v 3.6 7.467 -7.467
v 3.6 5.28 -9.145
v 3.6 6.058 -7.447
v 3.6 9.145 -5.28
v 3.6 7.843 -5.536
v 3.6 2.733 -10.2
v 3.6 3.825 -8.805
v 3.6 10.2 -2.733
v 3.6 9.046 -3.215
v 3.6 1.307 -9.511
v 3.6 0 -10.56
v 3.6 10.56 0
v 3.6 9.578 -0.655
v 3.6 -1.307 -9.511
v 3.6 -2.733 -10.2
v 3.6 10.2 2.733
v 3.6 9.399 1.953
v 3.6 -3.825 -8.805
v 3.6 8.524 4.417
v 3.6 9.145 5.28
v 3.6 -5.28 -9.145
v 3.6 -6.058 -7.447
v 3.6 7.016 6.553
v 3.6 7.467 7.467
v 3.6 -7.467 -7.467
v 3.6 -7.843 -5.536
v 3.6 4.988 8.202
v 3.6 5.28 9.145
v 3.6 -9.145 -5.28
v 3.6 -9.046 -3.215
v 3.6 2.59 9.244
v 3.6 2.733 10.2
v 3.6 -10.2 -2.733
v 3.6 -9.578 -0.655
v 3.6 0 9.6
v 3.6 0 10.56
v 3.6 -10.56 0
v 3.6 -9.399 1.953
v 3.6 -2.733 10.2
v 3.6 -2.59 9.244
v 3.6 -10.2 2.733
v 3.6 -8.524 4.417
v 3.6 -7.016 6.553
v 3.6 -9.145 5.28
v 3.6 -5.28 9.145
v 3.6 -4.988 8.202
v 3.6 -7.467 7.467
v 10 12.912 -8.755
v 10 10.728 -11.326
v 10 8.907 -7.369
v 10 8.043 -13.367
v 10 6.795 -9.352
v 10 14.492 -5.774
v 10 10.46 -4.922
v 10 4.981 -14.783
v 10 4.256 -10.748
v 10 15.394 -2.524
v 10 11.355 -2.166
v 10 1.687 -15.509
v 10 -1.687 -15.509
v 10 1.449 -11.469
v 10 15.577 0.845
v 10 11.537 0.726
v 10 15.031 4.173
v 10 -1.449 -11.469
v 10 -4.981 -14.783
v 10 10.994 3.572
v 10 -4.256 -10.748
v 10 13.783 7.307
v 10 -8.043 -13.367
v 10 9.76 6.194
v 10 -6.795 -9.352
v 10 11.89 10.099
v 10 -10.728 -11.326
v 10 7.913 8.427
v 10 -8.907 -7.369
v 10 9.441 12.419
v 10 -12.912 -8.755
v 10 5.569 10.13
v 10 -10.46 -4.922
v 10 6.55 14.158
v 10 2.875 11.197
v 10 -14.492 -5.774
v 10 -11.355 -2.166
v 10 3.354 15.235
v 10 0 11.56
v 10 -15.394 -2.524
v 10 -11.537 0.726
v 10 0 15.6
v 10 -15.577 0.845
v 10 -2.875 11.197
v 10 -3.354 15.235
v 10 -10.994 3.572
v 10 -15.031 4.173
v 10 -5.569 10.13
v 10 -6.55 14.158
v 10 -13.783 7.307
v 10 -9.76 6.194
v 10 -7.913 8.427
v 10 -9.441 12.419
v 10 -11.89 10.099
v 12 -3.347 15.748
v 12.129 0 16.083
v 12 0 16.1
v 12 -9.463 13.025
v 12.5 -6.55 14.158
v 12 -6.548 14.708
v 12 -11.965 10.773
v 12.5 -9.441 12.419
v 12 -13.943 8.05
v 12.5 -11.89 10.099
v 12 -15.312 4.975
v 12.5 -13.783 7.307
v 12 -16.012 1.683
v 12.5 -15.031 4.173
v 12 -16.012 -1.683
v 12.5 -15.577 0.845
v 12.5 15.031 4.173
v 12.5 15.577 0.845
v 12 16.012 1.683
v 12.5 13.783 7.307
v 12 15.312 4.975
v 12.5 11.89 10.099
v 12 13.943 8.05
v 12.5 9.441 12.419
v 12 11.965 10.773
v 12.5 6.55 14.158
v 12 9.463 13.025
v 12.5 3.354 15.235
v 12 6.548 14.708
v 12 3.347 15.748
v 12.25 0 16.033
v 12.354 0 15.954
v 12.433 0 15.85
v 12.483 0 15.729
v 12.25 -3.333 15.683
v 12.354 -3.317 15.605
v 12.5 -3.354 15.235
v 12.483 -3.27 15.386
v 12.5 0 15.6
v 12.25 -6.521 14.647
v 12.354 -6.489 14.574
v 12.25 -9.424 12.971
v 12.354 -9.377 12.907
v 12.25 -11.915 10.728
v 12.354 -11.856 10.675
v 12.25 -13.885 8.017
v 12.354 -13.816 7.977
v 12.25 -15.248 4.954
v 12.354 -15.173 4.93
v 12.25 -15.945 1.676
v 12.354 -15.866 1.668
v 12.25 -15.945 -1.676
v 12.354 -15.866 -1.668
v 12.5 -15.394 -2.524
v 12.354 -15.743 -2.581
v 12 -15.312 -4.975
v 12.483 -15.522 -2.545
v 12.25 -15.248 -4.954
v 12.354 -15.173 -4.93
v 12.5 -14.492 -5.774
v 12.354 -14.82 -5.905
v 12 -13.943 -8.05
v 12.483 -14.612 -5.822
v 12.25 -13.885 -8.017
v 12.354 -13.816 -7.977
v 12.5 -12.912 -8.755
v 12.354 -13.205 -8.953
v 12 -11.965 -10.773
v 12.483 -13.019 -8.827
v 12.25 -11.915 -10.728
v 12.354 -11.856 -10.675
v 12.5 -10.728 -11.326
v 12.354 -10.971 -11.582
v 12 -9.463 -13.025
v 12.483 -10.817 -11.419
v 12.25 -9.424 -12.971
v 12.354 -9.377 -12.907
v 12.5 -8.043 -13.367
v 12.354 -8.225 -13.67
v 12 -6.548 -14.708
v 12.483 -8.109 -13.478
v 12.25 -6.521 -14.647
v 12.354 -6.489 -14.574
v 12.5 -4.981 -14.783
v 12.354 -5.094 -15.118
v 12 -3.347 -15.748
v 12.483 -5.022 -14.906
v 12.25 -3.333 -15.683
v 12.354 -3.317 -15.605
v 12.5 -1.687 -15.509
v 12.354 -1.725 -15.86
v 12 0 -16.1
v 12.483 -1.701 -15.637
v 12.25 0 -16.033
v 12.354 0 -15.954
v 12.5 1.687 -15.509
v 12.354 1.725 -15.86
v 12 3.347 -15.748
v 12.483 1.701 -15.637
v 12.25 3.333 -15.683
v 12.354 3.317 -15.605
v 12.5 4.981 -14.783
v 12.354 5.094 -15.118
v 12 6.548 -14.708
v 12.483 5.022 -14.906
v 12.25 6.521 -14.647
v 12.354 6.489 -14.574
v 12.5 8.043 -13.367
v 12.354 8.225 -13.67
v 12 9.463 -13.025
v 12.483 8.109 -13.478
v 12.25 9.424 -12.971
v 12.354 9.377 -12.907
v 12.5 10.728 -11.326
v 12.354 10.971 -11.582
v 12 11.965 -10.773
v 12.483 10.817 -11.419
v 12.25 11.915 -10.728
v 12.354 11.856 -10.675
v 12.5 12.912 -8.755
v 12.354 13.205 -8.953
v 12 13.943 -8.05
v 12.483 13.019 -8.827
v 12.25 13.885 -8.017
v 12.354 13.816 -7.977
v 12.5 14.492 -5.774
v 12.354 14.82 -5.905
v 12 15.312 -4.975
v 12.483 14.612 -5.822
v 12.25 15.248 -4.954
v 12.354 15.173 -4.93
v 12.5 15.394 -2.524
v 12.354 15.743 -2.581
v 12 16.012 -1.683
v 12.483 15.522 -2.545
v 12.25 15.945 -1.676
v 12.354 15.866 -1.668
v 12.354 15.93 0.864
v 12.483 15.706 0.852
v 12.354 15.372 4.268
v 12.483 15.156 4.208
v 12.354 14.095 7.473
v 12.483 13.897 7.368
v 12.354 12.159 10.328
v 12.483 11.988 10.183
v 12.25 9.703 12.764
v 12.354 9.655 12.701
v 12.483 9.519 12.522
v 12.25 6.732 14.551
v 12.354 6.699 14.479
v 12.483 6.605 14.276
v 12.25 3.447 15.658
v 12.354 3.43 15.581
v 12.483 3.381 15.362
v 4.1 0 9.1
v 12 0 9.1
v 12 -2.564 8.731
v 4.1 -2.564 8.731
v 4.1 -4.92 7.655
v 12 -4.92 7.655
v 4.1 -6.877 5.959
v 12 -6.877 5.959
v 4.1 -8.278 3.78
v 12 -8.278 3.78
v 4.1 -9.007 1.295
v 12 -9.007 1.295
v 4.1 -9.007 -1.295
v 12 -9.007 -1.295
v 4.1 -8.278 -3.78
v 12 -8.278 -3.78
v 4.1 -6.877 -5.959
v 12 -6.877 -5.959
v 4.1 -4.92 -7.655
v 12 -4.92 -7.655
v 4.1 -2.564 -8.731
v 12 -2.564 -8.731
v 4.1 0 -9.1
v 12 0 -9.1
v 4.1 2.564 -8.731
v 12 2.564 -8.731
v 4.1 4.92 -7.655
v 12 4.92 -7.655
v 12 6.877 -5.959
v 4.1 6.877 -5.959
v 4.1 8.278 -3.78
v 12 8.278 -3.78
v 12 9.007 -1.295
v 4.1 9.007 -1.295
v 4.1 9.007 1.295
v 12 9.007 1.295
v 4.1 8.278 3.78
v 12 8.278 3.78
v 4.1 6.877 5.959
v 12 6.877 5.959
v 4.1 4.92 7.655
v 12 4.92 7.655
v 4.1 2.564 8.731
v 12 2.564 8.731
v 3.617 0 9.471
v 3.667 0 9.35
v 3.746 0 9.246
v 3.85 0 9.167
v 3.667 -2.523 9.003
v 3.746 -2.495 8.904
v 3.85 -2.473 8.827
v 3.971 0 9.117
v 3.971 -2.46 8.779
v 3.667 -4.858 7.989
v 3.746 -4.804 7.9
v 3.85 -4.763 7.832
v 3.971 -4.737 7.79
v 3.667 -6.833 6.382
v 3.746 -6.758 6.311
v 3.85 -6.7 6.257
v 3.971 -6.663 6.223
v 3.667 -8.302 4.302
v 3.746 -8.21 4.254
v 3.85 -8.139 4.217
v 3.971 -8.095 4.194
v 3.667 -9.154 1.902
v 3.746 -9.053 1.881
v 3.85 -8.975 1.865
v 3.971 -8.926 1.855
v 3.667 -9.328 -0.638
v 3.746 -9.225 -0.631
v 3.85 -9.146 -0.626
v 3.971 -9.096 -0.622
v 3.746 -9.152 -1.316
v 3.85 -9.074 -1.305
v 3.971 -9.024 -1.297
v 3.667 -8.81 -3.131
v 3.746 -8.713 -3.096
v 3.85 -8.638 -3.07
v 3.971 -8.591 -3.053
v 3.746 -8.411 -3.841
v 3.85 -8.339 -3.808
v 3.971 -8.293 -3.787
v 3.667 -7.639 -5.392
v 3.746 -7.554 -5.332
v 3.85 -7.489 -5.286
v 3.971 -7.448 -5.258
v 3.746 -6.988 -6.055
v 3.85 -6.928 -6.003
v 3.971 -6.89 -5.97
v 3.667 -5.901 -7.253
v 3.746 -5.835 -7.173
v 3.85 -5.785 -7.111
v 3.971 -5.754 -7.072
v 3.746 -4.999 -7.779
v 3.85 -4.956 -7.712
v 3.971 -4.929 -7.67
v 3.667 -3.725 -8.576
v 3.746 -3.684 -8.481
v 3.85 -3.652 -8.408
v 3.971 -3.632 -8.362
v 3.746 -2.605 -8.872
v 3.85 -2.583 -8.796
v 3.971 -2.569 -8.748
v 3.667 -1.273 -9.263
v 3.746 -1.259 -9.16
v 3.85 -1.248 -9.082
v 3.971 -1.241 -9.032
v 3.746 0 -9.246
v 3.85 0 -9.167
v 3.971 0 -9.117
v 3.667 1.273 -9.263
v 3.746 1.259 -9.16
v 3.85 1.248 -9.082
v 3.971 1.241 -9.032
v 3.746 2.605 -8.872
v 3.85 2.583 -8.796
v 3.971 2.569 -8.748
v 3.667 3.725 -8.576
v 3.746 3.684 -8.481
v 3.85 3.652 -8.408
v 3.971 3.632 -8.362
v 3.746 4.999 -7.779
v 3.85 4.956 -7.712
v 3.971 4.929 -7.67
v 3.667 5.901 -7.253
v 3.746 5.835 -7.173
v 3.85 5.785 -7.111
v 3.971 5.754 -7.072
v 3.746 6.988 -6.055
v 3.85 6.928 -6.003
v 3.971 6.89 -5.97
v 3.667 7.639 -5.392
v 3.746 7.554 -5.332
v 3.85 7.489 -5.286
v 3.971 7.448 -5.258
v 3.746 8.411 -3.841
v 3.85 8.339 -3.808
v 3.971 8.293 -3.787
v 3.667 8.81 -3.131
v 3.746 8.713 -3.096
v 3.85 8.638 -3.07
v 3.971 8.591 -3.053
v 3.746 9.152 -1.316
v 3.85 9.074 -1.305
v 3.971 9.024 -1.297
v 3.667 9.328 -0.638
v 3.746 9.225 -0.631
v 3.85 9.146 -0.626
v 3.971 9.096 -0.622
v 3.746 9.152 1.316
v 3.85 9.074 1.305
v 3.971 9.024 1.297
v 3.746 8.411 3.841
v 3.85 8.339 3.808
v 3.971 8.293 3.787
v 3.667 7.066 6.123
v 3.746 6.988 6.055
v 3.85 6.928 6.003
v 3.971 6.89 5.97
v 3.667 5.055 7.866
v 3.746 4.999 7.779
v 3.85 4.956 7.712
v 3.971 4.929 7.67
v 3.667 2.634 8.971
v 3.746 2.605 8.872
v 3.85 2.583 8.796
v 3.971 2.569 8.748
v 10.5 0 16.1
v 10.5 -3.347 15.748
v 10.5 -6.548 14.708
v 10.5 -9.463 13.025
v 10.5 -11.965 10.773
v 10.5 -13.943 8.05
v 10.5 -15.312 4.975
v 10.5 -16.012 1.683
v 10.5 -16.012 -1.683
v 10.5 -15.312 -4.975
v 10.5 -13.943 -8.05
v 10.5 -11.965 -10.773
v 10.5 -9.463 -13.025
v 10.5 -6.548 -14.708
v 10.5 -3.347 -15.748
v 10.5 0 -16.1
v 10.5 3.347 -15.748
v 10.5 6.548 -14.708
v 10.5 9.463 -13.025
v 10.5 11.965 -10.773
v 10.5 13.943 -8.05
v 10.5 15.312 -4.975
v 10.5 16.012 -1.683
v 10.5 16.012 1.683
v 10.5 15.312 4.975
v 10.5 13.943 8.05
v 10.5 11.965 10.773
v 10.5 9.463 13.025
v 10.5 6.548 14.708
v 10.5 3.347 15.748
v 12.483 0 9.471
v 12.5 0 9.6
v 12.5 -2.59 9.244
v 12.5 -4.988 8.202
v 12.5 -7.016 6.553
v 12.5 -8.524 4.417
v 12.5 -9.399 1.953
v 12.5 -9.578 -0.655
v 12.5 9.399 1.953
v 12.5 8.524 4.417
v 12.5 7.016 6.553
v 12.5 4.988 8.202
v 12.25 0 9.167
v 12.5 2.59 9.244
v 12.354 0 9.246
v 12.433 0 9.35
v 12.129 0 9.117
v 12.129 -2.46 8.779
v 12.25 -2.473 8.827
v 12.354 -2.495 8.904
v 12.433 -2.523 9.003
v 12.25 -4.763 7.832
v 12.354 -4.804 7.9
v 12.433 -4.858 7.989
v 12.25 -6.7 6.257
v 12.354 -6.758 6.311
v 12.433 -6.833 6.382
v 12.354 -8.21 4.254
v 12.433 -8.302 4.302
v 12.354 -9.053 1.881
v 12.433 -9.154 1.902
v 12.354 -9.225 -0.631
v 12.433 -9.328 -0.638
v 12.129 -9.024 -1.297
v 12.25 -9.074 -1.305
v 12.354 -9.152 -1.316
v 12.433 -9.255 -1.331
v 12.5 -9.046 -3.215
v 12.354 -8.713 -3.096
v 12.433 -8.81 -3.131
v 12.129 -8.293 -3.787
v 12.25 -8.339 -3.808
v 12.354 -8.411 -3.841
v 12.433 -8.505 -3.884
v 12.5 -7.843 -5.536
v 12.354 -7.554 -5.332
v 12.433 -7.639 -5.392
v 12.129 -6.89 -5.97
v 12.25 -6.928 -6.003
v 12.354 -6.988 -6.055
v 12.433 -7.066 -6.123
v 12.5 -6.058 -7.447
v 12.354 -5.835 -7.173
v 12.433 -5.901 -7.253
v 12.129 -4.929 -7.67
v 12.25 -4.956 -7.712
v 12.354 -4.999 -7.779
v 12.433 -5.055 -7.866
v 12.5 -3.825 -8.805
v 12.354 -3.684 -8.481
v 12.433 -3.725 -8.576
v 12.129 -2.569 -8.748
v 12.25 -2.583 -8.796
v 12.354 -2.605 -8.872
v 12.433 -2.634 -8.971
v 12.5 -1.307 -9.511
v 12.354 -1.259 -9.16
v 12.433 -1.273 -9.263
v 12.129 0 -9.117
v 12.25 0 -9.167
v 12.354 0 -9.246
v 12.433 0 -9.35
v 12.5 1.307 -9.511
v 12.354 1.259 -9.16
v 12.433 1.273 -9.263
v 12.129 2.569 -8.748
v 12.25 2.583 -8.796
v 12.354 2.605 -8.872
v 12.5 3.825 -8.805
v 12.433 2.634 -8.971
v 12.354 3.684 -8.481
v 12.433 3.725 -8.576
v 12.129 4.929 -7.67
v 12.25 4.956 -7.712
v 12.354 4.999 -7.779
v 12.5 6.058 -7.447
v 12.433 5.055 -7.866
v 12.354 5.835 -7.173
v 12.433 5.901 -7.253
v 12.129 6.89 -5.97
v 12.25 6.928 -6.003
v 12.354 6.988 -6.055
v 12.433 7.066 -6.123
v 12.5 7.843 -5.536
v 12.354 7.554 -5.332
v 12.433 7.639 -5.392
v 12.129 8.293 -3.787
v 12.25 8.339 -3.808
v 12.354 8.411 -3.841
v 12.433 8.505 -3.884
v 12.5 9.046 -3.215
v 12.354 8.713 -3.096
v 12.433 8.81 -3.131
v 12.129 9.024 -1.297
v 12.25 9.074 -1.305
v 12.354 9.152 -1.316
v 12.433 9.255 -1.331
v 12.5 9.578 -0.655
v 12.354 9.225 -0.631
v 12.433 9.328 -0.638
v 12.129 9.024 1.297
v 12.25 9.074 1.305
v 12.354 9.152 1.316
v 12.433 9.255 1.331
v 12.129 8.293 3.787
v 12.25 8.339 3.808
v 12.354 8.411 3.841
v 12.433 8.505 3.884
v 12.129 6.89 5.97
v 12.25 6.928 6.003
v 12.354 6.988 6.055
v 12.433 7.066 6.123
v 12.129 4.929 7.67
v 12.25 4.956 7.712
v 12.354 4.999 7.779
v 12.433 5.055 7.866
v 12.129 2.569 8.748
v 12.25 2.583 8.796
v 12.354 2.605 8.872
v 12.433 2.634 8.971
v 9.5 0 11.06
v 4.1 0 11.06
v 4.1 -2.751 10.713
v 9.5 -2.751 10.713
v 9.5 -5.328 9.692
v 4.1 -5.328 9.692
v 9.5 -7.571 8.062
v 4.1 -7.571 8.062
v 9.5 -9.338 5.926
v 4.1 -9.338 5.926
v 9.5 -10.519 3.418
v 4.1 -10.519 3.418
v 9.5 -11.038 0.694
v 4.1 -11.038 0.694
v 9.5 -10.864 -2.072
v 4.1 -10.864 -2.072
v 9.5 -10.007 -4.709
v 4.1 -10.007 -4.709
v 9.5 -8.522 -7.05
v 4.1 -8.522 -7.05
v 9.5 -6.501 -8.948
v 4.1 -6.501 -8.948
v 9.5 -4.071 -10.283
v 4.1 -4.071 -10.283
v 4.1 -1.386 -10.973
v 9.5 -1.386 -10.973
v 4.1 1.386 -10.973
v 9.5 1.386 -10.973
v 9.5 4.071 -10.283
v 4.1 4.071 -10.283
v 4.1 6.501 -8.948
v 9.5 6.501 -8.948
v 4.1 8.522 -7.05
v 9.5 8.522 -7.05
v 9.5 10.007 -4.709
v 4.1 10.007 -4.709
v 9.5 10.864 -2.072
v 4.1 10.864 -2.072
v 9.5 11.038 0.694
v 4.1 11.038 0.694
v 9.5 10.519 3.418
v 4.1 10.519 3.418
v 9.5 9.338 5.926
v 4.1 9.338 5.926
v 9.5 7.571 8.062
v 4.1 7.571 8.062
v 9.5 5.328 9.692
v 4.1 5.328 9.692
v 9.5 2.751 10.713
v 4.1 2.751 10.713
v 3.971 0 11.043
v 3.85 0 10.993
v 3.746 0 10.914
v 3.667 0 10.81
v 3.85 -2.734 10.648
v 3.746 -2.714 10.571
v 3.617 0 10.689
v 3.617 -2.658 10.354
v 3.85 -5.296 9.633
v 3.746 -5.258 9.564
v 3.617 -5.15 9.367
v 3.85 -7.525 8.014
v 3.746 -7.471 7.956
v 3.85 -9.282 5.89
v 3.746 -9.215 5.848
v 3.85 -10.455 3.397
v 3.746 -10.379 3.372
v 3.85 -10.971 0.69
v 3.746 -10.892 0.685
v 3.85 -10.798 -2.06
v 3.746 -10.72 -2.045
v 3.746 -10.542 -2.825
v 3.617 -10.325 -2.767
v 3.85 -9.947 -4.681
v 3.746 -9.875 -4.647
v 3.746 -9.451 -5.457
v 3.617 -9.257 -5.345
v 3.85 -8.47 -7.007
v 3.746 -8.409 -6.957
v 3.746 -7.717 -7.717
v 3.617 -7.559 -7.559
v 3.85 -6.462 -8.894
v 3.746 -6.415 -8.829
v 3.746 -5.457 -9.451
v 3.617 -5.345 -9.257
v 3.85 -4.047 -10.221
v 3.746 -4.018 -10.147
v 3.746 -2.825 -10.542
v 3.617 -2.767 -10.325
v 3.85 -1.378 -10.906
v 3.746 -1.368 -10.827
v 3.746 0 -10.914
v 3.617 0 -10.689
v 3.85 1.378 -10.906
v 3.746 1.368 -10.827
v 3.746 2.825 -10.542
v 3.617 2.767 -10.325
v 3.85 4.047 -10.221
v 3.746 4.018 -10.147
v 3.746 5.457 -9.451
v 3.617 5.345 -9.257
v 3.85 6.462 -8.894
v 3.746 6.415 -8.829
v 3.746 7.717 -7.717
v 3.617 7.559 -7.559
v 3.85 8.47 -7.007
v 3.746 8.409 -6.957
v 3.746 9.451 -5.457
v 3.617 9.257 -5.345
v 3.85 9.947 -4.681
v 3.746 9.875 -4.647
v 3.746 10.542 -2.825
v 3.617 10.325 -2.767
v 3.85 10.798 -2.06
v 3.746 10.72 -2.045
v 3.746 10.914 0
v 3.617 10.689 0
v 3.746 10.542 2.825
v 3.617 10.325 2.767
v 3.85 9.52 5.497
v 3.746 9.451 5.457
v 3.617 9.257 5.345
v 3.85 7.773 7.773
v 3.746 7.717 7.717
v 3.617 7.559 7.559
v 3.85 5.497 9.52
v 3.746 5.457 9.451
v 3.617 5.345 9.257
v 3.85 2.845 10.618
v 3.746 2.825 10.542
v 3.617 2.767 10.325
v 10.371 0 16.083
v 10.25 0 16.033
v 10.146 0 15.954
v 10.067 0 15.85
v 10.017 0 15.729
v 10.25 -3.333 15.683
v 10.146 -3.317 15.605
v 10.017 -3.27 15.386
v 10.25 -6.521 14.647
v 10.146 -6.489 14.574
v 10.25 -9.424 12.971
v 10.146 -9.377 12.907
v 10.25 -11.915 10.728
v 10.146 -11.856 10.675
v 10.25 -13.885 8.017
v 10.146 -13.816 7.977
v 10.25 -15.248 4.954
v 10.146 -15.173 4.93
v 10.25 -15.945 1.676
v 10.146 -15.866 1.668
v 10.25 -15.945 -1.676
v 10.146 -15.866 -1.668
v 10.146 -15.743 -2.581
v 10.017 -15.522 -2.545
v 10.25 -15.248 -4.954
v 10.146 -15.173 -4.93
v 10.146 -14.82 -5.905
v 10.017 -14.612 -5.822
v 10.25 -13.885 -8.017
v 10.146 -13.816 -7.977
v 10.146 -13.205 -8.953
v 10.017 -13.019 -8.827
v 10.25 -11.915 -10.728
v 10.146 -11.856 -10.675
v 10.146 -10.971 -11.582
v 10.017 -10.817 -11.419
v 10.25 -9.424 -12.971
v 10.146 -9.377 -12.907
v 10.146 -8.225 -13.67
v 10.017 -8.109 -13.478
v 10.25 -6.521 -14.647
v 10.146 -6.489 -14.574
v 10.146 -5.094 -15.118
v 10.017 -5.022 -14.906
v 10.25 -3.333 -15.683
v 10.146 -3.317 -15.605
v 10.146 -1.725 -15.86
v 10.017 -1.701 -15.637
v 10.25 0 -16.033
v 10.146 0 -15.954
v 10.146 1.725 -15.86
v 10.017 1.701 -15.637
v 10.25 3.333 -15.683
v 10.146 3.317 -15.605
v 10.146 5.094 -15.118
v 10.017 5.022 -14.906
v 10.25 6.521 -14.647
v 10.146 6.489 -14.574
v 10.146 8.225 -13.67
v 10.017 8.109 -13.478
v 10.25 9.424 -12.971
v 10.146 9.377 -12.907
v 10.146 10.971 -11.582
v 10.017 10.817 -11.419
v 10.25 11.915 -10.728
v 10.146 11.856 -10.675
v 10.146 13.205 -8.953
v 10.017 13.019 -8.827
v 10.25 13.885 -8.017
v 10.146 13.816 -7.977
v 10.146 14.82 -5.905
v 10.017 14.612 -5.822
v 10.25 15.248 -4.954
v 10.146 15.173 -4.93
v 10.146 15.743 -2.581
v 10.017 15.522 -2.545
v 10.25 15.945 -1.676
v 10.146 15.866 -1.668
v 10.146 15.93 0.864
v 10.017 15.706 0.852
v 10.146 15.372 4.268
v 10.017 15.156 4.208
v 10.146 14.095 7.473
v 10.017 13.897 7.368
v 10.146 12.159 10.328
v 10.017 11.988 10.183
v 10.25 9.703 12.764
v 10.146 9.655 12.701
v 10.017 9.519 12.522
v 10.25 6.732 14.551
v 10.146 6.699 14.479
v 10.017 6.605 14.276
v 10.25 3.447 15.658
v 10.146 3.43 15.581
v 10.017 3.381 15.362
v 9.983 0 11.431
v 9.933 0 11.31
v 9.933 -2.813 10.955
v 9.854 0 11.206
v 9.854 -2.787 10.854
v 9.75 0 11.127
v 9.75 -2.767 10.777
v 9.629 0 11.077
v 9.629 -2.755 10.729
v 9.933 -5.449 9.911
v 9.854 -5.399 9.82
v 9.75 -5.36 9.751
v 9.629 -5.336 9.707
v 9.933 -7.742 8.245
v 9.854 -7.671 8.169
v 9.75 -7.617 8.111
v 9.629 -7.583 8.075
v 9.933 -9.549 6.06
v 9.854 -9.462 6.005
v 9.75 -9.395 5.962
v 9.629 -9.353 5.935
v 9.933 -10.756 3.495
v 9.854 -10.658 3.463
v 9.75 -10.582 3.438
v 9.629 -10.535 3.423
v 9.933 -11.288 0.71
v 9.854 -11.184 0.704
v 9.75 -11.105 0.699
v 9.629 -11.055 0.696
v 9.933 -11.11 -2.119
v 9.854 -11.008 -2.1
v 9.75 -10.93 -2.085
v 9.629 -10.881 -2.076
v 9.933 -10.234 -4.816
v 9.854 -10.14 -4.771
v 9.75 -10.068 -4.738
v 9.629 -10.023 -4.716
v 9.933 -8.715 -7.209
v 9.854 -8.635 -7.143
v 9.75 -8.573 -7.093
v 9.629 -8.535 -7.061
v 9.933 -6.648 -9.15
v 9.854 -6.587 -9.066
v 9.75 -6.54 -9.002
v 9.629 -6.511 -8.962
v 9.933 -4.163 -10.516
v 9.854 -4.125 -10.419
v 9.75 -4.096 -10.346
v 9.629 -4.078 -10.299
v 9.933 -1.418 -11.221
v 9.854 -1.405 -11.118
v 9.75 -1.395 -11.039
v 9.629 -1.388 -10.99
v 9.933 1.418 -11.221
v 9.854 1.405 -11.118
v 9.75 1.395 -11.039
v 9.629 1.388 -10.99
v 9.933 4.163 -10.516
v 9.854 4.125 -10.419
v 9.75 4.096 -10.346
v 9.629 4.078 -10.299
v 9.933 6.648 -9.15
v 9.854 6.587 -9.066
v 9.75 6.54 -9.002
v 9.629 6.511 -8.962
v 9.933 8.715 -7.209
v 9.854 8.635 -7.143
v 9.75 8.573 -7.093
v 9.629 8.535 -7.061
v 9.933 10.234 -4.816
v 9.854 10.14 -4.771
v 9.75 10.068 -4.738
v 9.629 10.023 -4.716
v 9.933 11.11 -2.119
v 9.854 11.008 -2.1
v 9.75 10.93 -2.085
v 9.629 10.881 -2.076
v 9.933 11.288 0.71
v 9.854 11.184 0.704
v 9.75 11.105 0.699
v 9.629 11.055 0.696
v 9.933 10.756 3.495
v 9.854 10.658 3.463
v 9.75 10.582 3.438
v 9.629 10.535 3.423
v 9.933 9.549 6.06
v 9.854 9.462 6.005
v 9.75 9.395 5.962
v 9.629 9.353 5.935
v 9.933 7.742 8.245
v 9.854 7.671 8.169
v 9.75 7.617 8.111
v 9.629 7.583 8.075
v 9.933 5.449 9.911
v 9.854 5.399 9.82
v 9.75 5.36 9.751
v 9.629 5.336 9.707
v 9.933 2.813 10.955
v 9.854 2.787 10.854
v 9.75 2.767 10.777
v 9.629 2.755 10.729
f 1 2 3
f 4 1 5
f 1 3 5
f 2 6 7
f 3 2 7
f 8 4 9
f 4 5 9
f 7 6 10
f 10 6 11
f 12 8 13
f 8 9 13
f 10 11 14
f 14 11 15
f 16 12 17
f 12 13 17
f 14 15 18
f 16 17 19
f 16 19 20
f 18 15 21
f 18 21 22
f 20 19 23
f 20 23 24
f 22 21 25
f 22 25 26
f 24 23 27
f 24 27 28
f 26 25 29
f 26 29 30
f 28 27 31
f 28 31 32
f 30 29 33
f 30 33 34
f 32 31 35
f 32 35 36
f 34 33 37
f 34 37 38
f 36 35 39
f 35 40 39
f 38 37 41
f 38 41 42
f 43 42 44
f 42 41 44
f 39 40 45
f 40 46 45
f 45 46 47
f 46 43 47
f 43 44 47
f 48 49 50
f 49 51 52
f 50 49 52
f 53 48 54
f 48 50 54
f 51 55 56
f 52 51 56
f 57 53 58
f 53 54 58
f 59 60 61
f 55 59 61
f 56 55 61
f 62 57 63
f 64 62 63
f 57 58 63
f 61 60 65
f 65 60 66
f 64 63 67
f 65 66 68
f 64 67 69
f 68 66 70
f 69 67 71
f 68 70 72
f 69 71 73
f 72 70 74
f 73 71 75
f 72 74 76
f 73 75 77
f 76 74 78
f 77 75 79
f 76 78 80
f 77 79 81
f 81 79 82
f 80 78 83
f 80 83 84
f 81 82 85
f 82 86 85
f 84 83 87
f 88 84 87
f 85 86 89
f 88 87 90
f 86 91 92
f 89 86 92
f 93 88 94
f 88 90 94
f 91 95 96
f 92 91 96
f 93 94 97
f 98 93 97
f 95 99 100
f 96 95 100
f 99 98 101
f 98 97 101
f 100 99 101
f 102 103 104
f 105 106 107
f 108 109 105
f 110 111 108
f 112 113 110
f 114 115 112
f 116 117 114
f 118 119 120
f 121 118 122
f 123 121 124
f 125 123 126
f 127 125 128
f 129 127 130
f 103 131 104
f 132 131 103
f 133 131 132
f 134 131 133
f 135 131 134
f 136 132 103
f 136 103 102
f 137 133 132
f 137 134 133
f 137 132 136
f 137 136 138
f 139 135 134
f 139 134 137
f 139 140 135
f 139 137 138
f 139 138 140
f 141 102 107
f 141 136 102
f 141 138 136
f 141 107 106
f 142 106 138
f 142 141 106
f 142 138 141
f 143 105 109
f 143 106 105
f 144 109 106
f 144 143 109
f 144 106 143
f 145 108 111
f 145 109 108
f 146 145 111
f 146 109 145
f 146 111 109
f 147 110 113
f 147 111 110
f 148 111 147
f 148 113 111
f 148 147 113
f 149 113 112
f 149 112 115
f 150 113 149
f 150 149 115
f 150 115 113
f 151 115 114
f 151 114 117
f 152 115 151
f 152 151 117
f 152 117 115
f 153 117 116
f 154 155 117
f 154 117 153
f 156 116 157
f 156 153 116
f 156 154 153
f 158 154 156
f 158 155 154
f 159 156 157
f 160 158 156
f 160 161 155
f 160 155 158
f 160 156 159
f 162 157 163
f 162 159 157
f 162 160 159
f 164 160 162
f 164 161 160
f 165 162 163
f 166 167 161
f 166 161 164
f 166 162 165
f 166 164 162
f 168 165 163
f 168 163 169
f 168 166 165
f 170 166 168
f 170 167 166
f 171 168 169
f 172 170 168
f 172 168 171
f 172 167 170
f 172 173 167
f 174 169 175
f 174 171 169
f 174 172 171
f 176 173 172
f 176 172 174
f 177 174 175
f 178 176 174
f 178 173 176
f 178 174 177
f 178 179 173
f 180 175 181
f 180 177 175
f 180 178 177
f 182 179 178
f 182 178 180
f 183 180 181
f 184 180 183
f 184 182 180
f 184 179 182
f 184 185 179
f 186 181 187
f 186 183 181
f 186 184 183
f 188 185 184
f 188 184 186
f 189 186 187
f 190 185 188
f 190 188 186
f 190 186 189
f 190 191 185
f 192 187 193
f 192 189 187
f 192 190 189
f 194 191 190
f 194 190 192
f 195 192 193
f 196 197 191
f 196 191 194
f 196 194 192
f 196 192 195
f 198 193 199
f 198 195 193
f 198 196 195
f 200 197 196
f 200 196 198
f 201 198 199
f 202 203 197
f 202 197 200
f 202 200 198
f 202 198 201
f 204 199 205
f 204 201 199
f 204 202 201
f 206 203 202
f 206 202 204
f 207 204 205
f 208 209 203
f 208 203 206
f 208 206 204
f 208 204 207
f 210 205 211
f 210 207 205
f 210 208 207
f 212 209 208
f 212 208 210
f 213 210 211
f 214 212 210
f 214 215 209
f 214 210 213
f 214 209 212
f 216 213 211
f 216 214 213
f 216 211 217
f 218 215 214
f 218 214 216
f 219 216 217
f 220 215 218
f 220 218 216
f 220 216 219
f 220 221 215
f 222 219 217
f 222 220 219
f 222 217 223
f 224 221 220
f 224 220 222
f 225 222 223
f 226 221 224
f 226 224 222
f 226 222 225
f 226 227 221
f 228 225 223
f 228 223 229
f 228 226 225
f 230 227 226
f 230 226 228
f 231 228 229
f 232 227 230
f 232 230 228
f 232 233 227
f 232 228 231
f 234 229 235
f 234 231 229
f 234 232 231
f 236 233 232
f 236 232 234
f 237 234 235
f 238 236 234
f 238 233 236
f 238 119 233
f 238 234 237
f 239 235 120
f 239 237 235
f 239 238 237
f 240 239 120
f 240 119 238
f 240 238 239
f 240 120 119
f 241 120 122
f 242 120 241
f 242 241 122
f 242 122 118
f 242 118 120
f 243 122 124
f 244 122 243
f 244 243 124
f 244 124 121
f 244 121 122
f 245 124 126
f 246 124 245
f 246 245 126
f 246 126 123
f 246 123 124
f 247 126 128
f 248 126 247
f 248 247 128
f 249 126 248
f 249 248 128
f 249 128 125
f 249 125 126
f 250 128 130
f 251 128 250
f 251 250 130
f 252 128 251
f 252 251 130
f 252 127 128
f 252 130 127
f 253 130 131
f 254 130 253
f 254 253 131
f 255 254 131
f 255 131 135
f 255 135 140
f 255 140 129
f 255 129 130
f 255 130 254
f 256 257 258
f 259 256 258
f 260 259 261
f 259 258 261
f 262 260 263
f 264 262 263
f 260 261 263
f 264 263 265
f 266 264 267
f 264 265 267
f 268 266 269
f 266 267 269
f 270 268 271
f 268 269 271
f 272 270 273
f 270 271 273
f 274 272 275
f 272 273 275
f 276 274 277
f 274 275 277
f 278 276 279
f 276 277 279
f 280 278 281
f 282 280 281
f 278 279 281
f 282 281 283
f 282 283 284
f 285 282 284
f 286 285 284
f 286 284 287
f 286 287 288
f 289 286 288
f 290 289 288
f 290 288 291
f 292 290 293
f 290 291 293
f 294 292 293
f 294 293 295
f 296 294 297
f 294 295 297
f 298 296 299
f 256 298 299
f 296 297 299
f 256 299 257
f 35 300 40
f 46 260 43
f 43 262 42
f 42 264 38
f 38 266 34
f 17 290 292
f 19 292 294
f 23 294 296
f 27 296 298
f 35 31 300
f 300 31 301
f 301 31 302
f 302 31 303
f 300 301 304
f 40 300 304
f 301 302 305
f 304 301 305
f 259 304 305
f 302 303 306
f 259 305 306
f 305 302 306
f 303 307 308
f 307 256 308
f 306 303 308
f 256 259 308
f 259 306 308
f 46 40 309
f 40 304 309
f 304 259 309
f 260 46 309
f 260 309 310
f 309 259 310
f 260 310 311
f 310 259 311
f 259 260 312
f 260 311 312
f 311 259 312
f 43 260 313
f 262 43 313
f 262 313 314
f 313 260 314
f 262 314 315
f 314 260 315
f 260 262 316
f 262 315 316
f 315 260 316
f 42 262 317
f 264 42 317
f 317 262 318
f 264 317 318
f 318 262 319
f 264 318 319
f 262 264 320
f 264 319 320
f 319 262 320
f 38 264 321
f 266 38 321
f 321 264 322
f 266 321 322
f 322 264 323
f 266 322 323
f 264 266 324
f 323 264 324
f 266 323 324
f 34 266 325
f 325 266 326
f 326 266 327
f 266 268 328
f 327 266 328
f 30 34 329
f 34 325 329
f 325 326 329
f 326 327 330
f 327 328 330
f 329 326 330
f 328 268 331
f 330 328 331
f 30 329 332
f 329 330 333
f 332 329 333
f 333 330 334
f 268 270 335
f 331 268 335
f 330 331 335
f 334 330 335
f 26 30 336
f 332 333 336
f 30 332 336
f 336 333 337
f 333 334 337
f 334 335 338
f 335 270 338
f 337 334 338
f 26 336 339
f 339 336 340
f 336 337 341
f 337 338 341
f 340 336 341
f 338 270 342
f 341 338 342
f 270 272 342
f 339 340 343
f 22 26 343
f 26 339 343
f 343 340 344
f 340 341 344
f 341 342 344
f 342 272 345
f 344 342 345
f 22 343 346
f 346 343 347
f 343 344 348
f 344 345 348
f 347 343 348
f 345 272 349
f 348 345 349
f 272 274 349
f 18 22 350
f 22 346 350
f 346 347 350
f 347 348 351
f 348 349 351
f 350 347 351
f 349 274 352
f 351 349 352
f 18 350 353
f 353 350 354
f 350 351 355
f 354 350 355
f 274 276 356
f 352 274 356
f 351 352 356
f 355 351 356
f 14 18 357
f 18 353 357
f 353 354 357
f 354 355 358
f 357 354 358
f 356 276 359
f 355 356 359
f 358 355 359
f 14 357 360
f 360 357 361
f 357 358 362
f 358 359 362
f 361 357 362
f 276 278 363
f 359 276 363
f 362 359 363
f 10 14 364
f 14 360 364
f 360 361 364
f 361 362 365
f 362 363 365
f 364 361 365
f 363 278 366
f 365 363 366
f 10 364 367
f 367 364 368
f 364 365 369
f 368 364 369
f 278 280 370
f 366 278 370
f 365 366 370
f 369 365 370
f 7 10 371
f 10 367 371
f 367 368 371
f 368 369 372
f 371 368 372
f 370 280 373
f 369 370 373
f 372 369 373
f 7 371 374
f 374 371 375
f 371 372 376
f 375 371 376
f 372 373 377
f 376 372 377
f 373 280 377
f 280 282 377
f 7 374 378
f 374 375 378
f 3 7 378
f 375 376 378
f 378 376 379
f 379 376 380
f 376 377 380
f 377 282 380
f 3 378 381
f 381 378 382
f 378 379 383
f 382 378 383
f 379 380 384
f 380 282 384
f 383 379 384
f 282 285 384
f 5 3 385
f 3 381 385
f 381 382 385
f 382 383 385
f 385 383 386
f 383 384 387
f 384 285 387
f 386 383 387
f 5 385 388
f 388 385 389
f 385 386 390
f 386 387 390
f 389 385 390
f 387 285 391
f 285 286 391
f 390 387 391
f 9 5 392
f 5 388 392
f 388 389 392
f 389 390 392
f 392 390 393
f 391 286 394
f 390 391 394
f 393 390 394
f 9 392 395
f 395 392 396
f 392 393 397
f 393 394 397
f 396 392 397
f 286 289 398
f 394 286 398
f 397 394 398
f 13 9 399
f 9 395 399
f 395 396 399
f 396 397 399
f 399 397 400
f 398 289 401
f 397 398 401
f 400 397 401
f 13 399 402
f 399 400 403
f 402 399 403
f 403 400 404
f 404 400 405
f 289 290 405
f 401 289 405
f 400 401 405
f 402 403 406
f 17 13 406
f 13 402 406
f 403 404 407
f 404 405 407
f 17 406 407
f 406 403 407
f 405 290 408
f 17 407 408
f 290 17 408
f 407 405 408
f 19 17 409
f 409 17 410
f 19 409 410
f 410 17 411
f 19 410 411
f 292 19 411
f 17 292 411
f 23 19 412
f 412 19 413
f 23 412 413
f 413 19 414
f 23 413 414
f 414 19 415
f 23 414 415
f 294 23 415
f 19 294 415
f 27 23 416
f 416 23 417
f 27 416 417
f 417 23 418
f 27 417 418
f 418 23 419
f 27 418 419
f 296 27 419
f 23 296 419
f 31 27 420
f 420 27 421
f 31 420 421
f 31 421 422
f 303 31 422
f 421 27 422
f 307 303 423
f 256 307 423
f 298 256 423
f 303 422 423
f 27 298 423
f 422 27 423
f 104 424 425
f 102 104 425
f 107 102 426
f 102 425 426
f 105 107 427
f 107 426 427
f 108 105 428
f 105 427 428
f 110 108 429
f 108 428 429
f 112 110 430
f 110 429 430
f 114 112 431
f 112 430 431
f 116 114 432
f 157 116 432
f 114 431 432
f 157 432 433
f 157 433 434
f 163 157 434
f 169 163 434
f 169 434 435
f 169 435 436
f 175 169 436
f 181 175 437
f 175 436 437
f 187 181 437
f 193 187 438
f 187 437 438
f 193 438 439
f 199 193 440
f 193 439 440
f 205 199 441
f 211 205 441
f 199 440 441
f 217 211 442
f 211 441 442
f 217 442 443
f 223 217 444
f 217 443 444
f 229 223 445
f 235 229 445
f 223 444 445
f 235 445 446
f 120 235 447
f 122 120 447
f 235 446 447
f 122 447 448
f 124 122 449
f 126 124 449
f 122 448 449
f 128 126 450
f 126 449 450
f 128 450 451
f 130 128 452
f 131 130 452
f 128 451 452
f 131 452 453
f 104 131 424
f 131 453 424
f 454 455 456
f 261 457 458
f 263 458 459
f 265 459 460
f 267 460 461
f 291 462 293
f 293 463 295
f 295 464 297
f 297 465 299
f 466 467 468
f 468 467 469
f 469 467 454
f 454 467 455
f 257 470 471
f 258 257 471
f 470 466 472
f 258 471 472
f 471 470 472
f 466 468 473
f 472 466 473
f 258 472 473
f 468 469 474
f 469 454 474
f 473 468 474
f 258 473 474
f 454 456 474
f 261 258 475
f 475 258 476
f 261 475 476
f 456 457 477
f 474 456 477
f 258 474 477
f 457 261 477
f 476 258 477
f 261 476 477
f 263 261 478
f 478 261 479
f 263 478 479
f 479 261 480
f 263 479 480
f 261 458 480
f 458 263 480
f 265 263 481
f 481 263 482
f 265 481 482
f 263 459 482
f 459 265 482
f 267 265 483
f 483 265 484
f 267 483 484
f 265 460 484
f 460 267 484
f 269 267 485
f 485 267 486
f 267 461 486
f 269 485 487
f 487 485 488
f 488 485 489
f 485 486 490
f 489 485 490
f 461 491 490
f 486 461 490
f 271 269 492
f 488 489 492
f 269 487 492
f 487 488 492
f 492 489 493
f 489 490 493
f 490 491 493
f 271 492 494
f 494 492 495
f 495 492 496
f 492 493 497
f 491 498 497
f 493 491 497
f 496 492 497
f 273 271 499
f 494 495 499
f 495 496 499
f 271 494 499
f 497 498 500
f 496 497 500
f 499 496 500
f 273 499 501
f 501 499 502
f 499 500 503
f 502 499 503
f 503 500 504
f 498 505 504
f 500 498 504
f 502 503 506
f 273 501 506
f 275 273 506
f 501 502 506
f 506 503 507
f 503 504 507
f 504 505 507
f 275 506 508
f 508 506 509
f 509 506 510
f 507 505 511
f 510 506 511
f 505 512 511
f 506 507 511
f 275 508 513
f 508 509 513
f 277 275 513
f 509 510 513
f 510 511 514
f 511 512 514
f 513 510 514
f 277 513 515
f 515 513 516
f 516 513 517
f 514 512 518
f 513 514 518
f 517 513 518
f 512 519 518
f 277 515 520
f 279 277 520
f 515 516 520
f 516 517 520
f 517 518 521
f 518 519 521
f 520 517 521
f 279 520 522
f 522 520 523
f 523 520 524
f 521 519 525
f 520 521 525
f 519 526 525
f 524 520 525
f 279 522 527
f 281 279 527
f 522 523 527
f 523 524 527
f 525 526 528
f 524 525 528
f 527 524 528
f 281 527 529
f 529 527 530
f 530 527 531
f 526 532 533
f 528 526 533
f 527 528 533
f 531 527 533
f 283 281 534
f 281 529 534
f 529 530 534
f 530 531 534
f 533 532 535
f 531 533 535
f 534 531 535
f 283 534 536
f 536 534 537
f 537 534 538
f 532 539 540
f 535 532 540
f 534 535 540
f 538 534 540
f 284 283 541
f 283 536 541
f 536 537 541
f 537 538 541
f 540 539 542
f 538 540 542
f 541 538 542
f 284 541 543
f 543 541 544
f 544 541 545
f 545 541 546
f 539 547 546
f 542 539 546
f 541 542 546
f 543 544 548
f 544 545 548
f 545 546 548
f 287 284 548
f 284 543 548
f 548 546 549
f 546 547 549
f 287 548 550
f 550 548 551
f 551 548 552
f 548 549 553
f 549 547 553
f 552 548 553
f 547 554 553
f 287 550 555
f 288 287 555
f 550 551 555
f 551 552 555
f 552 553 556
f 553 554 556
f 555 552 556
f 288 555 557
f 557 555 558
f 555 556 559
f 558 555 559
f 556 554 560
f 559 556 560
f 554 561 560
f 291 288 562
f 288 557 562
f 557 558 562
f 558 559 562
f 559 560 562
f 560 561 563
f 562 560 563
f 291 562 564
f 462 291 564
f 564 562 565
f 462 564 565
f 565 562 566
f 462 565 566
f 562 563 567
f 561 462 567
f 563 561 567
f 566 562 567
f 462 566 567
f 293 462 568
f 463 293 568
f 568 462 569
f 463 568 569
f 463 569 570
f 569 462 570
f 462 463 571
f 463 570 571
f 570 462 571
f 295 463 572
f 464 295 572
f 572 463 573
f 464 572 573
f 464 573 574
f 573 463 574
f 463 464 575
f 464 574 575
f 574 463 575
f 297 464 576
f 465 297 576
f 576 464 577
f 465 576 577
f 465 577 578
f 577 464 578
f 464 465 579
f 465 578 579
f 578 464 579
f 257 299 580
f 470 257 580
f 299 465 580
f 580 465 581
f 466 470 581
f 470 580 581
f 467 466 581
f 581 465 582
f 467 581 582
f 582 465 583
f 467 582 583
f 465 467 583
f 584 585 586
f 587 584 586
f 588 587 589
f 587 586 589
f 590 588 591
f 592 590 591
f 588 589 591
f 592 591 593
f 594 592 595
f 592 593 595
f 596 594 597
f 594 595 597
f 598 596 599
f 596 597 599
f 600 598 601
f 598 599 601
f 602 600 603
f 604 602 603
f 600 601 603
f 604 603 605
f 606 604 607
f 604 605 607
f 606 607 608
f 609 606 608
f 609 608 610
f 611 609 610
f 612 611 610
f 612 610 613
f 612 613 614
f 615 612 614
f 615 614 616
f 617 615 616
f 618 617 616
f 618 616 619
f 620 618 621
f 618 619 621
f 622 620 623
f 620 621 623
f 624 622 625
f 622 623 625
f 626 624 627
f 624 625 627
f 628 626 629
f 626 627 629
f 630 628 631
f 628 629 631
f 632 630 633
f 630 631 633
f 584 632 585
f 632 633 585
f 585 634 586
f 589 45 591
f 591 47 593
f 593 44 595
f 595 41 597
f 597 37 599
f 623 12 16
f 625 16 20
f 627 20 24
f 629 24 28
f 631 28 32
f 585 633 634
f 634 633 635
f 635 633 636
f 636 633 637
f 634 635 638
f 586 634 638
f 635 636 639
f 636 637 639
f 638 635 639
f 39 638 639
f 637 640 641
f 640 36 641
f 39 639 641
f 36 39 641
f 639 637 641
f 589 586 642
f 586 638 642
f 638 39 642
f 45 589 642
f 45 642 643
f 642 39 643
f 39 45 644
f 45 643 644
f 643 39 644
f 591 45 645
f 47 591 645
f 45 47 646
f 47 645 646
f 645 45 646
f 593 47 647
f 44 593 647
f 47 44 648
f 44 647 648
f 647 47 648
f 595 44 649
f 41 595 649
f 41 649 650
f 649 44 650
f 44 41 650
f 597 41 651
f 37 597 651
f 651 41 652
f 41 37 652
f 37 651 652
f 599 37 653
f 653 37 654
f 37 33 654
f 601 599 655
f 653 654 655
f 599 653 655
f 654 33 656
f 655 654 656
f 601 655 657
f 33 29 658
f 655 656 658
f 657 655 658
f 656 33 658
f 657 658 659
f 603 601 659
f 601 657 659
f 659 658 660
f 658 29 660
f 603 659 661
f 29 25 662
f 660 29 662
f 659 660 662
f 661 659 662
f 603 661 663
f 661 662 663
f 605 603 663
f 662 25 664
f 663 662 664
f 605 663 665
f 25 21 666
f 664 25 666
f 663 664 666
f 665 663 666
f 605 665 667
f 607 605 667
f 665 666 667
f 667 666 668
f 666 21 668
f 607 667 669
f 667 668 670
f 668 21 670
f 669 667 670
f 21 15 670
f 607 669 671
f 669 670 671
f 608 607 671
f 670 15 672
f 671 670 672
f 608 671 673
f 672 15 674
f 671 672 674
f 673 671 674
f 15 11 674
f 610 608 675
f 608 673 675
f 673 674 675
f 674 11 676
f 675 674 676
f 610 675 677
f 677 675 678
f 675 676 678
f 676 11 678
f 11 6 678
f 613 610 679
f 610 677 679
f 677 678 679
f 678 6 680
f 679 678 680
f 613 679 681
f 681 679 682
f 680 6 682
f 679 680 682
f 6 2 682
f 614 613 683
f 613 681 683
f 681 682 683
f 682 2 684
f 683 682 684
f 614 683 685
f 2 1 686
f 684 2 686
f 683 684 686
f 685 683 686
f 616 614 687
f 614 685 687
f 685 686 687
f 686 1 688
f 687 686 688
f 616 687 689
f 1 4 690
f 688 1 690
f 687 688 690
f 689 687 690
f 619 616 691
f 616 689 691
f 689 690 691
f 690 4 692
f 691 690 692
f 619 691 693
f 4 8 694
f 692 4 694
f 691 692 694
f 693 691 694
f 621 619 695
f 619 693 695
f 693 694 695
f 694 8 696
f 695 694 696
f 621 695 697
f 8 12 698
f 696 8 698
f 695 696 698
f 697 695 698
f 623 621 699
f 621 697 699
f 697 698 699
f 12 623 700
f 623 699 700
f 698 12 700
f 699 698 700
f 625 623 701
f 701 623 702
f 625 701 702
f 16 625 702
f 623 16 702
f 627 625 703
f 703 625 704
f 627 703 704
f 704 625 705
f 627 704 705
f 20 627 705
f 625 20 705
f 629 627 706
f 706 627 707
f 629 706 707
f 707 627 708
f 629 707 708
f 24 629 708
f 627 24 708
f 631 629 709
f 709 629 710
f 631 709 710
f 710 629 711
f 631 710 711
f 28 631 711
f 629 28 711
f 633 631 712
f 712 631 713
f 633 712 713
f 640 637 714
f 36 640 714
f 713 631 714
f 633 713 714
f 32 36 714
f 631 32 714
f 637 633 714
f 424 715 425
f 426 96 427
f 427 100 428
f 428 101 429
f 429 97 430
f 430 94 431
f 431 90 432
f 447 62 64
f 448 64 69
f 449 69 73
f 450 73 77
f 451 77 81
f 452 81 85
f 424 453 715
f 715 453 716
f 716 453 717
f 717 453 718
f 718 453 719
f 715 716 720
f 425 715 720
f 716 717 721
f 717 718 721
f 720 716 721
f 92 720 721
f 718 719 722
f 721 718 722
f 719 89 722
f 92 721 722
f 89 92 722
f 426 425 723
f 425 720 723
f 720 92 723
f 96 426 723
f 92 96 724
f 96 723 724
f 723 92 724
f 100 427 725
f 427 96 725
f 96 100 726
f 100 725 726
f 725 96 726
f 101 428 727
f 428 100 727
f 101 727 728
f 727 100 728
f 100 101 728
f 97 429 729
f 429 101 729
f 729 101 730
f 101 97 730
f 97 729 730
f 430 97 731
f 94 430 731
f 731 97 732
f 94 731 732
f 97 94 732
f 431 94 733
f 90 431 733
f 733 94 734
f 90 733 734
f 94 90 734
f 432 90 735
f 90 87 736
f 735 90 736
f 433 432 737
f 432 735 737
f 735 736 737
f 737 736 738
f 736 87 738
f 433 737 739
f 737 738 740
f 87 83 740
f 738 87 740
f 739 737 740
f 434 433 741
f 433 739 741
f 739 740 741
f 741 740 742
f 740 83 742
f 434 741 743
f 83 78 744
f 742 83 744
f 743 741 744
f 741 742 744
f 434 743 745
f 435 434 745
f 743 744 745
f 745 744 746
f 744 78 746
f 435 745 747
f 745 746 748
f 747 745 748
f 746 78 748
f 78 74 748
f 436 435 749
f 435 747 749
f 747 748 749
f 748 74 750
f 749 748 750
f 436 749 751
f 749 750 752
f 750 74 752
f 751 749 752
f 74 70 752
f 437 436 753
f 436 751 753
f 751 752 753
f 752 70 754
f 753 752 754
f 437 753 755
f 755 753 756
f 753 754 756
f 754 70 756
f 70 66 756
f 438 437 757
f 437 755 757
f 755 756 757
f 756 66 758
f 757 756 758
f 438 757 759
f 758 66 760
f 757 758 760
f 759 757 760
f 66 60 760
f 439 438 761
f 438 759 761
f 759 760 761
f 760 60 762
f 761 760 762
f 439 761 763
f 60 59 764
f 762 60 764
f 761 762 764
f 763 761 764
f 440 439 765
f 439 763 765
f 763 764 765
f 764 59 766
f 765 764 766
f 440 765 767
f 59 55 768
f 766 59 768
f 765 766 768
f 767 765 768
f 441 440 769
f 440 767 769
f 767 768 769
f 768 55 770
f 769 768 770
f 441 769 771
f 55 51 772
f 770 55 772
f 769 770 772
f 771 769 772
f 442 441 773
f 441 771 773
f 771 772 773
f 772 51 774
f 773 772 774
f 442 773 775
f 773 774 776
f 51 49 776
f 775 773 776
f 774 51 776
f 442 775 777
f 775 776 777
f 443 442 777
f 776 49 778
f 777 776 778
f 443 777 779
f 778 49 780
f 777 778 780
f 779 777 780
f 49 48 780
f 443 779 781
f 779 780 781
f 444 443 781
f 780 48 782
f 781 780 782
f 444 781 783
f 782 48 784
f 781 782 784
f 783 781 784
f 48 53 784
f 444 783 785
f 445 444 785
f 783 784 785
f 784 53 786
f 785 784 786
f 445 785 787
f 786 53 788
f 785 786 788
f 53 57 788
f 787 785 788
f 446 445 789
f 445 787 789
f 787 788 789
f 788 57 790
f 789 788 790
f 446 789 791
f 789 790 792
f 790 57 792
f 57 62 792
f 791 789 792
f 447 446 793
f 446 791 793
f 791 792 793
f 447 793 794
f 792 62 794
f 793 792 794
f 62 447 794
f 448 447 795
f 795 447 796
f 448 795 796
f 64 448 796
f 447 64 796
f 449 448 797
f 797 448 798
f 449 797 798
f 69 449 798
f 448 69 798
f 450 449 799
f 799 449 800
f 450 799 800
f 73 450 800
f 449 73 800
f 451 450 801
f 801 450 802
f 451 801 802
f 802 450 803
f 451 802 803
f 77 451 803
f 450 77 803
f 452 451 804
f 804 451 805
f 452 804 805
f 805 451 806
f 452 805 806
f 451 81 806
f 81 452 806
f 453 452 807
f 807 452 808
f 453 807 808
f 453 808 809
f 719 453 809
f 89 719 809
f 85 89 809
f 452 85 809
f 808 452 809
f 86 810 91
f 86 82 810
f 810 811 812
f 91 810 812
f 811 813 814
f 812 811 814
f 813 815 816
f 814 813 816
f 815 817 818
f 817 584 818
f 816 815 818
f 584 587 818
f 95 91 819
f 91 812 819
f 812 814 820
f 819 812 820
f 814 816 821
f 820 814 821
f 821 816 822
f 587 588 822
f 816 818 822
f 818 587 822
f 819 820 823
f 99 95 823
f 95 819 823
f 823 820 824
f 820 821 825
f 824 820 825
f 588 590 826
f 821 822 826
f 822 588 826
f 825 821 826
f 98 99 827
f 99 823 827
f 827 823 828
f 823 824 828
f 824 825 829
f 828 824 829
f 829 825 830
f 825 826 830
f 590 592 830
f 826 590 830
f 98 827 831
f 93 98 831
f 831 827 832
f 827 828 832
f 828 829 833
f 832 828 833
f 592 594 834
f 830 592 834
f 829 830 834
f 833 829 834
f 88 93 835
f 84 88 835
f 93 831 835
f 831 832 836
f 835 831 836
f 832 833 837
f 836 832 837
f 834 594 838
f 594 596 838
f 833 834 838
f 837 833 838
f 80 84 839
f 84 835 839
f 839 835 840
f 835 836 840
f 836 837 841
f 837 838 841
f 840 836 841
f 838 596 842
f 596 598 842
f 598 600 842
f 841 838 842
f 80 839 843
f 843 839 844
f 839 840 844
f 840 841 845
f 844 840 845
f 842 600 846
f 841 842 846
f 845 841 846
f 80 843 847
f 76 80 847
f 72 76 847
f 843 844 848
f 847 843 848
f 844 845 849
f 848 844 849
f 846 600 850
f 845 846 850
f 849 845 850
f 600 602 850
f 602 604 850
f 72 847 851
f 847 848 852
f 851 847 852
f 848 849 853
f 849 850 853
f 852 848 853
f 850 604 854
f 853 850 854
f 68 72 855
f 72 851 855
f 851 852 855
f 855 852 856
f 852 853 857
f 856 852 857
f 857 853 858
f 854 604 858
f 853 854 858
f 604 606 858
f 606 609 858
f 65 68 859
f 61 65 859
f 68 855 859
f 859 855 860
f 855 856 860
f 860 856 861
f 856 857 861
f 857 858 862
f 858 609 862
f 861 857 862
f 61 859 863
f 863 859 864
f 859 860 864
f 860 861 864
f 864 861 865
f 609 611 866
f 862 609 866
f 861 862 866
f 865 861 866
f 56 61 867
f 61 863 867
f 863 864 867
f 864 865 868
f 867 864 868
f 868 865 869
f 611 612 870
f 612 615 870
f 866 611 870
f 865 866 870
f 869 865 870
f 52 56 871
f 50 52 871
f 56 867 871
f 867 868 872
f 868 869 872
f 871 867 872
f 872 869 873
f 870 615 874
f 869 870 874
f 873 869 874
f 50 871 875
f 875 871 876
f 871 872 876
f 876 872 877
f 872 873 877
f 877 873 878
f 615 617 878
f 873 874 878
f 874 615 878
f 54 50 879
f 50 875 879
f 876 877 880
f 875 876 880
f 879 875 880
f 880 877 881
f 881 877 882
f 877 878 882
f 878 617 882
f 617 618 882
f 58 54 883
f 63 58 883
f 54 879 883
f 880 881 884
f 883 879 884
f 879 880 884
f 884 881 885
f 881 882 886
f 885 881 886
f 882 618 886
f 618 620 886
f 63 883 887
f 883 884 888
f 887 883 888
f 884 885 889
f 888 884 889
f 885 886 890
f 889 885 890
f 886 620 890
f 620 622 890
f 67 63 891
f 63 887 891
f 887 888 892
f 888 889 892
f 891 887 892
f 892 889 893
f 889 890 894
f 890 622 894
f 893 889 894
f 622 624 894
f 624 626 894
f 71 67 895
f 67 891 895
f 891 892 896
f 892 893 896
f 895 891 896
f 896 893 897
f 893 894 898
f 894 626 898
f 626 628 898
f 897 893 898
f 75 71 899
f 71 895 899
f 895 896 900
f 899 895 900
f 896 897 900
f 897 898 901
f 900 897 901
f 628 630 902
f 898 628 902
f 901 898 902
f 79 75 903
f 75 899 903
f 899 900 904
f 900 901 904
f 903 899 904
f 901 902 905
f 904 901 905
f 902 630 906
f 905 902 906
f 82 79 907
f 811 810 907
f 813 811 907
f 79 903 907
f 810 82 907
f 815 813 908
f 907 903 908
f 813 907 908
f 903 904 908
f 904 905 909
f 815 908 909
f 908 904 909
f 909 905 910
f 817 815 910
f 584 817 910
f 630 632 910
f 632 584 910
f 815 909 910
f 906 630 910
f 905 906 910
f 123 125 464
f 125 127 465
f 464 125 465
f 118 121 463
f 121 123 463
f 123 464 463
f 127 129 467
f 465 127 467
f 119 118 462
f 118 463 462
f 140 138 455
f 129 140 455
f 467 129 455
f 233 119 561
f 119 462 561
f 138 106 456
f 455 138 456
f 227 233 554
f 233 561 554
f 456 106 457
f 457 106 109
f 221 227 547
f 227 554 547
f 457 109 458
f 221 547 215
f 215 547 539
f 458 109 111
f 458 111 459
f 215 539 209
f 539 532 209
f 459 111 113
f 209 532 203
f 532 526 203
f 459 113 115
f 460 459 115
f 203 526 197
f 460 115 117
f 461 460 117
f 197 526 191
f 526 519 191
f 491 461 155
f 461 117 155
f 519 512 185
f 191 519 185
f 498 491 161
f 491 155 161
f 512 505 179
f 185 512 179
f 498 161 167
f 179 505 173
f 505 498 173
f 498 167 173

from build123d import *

# Parameters (mm, degrees)
FILLET1_R = 0.5


with BuildPart() as part:
    # Sketch1 → Revolve1 (revolve)
    with BuildSketch(Plane.XY, mode=Mode.PRIVATE) as revolve1_sk:
        Polygon((12.5, 16.1), (10, 16.1), (10, 13.6), (10, 11.06), (3.6, 11.06), (3.6, 9.1), (12.5, 9.1), align=None)
    revolve(revolve1_sk.sketch.rotate(Axis((-30.849638619, 0, 0), (1, 0, 0)), 90), axis=Axis((-30.849638619, 0, 0), (1, 0, 0)))

    # Fillet1
    fillet1_edges = [part.edges().sort_by_distance(p)[0] for p in [
        (10, 0, -16.1),
        (12.5, 0, -16.1),
        (12.5, 0, -9.1),
        (3.6, 0, -9.1),
        (3.6, 0, -11.06),
        (10, 0, -11.06),
    ]]
    fillet(fillet1_edges, radius=FILLET1_R)


solid = part.part
